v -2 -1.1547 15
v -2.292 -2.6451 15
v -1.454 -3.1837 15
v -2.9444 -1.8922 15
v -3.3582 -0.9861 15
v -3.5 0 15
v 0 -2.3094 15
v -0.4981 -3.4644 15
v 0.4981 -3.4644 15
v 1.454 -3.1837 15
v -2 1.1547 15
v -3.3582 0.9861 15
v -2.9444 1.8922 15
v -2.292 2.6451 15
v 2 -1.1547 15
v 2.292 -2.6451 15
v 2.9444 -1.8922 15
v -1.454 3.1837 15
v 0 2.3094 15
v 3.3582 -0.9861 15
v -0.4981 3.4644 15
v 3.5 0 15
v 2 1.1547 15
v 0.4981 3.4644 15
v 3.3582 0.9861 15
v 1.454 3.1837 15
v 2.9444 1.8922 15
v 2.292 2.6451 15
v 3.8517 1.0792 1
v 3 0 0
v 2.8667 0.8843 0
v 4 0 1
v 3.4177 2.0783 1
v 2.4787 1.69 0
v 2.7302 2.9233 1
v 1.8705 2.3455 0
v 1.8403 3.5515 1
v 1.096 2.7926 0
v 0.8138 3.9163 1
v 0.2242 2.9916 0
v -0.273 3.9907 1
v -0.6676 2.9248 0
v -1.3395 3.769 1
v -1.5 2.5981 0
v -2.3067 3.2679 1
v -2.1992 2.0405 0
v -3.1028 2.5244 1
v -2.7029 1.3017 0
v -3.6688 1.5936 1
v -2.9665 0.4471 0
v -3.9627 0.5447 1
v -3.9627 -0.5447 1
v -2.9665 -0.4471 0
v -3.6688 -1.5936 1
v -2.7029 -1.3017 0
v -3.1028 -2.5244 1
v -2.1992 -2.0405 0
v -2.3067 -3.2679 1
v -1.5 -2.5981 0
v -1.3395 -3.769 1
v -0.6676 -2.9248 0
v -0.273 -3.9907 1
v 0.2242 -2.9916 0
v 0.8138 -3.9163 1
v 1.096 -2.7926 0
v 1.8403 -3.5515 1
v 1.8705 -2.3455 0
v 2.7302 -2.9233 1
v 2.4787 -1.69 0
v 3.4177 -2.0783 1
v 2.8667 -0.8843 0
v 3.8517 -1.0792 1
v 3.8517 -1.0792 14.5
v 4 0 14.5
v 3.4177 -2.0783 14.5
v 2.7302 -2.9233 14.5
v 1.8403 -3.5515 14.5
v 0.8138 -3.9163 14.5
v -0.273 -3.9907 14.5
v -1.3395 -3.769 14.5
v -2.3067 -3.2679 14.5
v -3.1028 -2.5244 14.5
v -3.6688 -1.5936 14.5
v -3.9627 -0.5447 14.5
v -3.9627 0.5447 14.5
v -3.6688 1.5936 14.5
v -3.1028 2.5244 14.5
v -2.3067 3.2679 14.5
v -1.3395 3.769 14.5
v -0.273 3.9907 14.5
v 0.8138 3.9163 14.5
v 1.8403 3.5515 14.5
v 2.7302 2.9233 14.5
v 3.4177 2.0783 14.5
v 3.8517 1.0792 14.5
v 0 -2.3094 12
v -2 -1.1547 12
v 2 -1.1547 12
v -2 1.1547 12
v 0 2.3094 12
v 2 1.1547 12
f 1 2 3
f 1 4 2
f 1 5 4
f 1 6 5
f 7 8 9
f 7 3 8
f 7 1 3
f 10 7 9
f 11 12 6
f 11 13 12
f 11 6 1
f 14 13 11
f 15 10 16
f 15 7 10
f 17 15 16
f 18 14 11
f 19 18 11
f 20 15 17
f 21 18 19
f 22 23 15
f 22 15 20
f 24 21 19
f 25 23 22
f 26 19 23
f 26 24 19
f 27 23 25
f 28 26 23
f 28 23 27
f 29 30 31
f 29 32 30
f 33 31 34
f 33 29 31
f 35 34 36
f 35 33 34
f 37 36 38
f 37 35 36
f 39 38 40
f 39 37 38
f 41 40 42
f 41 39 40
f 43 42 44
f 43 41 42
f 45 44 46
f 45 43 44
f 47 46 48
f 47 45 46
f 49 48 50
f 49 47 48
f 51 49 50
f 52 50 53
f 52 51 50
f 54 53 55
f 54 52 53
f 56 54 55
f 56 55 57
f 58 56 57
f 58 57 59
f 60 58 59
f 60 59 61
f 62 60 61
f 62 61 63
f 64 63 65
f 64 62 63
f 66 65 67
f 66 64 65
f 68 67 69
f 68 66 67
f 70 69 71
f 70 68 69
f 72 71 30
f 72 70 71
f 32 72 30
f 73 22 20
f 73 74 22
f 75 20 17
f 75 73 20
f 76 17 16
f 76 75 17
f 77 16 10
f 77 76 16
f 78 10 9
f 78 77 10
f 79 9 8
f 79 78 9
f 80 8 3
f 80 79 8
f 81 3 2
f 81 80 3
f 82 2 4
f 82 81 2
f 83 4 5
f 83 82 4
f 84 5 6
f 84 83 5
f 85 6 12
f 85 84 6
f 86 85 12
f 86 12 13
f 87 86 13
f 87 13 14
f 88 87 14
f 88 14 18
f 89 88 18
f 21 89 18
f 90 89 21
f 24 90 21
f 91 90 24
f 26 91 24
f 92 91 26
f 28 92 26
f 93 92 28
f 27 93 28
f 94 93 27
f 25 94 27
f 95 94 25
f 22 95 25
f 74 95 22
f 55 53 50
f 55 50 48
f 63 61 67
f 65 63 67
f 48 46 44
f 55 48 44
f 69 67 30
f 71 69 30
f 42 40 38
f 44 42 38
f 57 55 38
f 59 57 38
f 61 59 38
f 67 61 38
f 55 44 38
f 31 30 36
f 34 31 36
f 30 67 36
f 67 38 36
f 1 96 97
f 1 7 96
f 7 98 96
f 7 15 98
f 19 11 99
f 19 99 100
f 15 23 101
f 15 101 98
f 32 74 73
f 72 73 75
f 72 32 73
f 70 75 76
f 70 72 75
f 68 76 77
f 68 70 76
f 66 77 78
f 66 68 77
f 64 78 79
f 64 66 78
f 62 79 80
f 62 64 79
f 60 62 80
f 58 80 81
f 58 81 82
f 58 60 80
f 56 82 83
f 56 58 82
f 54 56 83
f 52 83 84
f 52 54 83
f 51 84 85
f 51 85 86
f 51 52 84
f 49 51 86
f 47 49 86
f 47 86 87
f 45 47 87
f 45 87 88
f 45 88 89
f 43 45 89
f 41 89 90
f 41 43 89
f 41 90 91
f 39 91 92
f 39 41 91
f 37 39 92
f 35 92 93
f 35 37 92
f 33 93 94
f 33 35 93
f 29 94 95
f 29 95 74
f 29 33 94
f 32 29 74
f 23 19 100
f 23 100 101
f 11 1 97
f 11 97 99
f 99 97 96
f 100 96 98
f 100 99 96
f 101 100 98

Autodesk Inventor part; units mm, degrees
ref_plane "YZ Plane" through (0, 0, 0) normal (1, 0, 0) x (0, 1, 0)
ref_plane "XZ Plane" through (0, 0, 0) normal (0, 1, 0) x (-1, 0, 0)
ref_plane "XY Plane" through (0, 0, 0) normal (0, 0, 1) x (1, 0, 0)
sketch "Sketch1" plane through (0, 0, 0) normal (0, 0, 1) x (1, 0, 0)
  line L0 (0, 5.6) -> (0, -5.6) projected
  line L1 (-5.6, 0) -> (5.6, 0) projected
  circle A0 centre (0, 0) radius 4
  dimension "d0" = 8
extrude "Extrusion1" add sketch "Sketch1" along normal blind 15
chamfer "Chamfer1" distance 1 angle 45 1 edges at (-4, 0, 0)
chamfer "Chamfer2" distance 0.5 angle 45 1 edges at (-4, 0, 15)
sketch "Sketch2" plane through (0, 0, 15) normal (0, 0, 1) x (1, 0, 0)
  circle A0 centre (0, 0) radius 3.5 projected
  line L0 (2, -1.1547) -> (0, -2.3094)
  line L1 (0, -2.3094) -> (-2, -1.1547)
  line L2 (-2, -1.1547) -> (-2, 1.1547)
  line L3 (-2, 1.1547) -> (0, 2.3094)
  line L4 (0, 2.3094) -> (2, 1.1547)
  line L5 (2, 1.1547) -> (2, -1.1547)
  line L6 (0, 5.6) -> (0, -5.6) projected
  dimension "d9" = 2
extrude "Extrusion2" cut sketch "Sketch2" against normal blind 3 contours L6 L1 L2 L3 | L4 L5 L0 L6
thread "Thread1" size "M8x1.25" class "6g" standard "ANSI Metric M Profile" full length
properties part number "SCREW,SET,CUP POINT,SS, M8X1.25X15MM" material "Stainless Steel, 304L"
